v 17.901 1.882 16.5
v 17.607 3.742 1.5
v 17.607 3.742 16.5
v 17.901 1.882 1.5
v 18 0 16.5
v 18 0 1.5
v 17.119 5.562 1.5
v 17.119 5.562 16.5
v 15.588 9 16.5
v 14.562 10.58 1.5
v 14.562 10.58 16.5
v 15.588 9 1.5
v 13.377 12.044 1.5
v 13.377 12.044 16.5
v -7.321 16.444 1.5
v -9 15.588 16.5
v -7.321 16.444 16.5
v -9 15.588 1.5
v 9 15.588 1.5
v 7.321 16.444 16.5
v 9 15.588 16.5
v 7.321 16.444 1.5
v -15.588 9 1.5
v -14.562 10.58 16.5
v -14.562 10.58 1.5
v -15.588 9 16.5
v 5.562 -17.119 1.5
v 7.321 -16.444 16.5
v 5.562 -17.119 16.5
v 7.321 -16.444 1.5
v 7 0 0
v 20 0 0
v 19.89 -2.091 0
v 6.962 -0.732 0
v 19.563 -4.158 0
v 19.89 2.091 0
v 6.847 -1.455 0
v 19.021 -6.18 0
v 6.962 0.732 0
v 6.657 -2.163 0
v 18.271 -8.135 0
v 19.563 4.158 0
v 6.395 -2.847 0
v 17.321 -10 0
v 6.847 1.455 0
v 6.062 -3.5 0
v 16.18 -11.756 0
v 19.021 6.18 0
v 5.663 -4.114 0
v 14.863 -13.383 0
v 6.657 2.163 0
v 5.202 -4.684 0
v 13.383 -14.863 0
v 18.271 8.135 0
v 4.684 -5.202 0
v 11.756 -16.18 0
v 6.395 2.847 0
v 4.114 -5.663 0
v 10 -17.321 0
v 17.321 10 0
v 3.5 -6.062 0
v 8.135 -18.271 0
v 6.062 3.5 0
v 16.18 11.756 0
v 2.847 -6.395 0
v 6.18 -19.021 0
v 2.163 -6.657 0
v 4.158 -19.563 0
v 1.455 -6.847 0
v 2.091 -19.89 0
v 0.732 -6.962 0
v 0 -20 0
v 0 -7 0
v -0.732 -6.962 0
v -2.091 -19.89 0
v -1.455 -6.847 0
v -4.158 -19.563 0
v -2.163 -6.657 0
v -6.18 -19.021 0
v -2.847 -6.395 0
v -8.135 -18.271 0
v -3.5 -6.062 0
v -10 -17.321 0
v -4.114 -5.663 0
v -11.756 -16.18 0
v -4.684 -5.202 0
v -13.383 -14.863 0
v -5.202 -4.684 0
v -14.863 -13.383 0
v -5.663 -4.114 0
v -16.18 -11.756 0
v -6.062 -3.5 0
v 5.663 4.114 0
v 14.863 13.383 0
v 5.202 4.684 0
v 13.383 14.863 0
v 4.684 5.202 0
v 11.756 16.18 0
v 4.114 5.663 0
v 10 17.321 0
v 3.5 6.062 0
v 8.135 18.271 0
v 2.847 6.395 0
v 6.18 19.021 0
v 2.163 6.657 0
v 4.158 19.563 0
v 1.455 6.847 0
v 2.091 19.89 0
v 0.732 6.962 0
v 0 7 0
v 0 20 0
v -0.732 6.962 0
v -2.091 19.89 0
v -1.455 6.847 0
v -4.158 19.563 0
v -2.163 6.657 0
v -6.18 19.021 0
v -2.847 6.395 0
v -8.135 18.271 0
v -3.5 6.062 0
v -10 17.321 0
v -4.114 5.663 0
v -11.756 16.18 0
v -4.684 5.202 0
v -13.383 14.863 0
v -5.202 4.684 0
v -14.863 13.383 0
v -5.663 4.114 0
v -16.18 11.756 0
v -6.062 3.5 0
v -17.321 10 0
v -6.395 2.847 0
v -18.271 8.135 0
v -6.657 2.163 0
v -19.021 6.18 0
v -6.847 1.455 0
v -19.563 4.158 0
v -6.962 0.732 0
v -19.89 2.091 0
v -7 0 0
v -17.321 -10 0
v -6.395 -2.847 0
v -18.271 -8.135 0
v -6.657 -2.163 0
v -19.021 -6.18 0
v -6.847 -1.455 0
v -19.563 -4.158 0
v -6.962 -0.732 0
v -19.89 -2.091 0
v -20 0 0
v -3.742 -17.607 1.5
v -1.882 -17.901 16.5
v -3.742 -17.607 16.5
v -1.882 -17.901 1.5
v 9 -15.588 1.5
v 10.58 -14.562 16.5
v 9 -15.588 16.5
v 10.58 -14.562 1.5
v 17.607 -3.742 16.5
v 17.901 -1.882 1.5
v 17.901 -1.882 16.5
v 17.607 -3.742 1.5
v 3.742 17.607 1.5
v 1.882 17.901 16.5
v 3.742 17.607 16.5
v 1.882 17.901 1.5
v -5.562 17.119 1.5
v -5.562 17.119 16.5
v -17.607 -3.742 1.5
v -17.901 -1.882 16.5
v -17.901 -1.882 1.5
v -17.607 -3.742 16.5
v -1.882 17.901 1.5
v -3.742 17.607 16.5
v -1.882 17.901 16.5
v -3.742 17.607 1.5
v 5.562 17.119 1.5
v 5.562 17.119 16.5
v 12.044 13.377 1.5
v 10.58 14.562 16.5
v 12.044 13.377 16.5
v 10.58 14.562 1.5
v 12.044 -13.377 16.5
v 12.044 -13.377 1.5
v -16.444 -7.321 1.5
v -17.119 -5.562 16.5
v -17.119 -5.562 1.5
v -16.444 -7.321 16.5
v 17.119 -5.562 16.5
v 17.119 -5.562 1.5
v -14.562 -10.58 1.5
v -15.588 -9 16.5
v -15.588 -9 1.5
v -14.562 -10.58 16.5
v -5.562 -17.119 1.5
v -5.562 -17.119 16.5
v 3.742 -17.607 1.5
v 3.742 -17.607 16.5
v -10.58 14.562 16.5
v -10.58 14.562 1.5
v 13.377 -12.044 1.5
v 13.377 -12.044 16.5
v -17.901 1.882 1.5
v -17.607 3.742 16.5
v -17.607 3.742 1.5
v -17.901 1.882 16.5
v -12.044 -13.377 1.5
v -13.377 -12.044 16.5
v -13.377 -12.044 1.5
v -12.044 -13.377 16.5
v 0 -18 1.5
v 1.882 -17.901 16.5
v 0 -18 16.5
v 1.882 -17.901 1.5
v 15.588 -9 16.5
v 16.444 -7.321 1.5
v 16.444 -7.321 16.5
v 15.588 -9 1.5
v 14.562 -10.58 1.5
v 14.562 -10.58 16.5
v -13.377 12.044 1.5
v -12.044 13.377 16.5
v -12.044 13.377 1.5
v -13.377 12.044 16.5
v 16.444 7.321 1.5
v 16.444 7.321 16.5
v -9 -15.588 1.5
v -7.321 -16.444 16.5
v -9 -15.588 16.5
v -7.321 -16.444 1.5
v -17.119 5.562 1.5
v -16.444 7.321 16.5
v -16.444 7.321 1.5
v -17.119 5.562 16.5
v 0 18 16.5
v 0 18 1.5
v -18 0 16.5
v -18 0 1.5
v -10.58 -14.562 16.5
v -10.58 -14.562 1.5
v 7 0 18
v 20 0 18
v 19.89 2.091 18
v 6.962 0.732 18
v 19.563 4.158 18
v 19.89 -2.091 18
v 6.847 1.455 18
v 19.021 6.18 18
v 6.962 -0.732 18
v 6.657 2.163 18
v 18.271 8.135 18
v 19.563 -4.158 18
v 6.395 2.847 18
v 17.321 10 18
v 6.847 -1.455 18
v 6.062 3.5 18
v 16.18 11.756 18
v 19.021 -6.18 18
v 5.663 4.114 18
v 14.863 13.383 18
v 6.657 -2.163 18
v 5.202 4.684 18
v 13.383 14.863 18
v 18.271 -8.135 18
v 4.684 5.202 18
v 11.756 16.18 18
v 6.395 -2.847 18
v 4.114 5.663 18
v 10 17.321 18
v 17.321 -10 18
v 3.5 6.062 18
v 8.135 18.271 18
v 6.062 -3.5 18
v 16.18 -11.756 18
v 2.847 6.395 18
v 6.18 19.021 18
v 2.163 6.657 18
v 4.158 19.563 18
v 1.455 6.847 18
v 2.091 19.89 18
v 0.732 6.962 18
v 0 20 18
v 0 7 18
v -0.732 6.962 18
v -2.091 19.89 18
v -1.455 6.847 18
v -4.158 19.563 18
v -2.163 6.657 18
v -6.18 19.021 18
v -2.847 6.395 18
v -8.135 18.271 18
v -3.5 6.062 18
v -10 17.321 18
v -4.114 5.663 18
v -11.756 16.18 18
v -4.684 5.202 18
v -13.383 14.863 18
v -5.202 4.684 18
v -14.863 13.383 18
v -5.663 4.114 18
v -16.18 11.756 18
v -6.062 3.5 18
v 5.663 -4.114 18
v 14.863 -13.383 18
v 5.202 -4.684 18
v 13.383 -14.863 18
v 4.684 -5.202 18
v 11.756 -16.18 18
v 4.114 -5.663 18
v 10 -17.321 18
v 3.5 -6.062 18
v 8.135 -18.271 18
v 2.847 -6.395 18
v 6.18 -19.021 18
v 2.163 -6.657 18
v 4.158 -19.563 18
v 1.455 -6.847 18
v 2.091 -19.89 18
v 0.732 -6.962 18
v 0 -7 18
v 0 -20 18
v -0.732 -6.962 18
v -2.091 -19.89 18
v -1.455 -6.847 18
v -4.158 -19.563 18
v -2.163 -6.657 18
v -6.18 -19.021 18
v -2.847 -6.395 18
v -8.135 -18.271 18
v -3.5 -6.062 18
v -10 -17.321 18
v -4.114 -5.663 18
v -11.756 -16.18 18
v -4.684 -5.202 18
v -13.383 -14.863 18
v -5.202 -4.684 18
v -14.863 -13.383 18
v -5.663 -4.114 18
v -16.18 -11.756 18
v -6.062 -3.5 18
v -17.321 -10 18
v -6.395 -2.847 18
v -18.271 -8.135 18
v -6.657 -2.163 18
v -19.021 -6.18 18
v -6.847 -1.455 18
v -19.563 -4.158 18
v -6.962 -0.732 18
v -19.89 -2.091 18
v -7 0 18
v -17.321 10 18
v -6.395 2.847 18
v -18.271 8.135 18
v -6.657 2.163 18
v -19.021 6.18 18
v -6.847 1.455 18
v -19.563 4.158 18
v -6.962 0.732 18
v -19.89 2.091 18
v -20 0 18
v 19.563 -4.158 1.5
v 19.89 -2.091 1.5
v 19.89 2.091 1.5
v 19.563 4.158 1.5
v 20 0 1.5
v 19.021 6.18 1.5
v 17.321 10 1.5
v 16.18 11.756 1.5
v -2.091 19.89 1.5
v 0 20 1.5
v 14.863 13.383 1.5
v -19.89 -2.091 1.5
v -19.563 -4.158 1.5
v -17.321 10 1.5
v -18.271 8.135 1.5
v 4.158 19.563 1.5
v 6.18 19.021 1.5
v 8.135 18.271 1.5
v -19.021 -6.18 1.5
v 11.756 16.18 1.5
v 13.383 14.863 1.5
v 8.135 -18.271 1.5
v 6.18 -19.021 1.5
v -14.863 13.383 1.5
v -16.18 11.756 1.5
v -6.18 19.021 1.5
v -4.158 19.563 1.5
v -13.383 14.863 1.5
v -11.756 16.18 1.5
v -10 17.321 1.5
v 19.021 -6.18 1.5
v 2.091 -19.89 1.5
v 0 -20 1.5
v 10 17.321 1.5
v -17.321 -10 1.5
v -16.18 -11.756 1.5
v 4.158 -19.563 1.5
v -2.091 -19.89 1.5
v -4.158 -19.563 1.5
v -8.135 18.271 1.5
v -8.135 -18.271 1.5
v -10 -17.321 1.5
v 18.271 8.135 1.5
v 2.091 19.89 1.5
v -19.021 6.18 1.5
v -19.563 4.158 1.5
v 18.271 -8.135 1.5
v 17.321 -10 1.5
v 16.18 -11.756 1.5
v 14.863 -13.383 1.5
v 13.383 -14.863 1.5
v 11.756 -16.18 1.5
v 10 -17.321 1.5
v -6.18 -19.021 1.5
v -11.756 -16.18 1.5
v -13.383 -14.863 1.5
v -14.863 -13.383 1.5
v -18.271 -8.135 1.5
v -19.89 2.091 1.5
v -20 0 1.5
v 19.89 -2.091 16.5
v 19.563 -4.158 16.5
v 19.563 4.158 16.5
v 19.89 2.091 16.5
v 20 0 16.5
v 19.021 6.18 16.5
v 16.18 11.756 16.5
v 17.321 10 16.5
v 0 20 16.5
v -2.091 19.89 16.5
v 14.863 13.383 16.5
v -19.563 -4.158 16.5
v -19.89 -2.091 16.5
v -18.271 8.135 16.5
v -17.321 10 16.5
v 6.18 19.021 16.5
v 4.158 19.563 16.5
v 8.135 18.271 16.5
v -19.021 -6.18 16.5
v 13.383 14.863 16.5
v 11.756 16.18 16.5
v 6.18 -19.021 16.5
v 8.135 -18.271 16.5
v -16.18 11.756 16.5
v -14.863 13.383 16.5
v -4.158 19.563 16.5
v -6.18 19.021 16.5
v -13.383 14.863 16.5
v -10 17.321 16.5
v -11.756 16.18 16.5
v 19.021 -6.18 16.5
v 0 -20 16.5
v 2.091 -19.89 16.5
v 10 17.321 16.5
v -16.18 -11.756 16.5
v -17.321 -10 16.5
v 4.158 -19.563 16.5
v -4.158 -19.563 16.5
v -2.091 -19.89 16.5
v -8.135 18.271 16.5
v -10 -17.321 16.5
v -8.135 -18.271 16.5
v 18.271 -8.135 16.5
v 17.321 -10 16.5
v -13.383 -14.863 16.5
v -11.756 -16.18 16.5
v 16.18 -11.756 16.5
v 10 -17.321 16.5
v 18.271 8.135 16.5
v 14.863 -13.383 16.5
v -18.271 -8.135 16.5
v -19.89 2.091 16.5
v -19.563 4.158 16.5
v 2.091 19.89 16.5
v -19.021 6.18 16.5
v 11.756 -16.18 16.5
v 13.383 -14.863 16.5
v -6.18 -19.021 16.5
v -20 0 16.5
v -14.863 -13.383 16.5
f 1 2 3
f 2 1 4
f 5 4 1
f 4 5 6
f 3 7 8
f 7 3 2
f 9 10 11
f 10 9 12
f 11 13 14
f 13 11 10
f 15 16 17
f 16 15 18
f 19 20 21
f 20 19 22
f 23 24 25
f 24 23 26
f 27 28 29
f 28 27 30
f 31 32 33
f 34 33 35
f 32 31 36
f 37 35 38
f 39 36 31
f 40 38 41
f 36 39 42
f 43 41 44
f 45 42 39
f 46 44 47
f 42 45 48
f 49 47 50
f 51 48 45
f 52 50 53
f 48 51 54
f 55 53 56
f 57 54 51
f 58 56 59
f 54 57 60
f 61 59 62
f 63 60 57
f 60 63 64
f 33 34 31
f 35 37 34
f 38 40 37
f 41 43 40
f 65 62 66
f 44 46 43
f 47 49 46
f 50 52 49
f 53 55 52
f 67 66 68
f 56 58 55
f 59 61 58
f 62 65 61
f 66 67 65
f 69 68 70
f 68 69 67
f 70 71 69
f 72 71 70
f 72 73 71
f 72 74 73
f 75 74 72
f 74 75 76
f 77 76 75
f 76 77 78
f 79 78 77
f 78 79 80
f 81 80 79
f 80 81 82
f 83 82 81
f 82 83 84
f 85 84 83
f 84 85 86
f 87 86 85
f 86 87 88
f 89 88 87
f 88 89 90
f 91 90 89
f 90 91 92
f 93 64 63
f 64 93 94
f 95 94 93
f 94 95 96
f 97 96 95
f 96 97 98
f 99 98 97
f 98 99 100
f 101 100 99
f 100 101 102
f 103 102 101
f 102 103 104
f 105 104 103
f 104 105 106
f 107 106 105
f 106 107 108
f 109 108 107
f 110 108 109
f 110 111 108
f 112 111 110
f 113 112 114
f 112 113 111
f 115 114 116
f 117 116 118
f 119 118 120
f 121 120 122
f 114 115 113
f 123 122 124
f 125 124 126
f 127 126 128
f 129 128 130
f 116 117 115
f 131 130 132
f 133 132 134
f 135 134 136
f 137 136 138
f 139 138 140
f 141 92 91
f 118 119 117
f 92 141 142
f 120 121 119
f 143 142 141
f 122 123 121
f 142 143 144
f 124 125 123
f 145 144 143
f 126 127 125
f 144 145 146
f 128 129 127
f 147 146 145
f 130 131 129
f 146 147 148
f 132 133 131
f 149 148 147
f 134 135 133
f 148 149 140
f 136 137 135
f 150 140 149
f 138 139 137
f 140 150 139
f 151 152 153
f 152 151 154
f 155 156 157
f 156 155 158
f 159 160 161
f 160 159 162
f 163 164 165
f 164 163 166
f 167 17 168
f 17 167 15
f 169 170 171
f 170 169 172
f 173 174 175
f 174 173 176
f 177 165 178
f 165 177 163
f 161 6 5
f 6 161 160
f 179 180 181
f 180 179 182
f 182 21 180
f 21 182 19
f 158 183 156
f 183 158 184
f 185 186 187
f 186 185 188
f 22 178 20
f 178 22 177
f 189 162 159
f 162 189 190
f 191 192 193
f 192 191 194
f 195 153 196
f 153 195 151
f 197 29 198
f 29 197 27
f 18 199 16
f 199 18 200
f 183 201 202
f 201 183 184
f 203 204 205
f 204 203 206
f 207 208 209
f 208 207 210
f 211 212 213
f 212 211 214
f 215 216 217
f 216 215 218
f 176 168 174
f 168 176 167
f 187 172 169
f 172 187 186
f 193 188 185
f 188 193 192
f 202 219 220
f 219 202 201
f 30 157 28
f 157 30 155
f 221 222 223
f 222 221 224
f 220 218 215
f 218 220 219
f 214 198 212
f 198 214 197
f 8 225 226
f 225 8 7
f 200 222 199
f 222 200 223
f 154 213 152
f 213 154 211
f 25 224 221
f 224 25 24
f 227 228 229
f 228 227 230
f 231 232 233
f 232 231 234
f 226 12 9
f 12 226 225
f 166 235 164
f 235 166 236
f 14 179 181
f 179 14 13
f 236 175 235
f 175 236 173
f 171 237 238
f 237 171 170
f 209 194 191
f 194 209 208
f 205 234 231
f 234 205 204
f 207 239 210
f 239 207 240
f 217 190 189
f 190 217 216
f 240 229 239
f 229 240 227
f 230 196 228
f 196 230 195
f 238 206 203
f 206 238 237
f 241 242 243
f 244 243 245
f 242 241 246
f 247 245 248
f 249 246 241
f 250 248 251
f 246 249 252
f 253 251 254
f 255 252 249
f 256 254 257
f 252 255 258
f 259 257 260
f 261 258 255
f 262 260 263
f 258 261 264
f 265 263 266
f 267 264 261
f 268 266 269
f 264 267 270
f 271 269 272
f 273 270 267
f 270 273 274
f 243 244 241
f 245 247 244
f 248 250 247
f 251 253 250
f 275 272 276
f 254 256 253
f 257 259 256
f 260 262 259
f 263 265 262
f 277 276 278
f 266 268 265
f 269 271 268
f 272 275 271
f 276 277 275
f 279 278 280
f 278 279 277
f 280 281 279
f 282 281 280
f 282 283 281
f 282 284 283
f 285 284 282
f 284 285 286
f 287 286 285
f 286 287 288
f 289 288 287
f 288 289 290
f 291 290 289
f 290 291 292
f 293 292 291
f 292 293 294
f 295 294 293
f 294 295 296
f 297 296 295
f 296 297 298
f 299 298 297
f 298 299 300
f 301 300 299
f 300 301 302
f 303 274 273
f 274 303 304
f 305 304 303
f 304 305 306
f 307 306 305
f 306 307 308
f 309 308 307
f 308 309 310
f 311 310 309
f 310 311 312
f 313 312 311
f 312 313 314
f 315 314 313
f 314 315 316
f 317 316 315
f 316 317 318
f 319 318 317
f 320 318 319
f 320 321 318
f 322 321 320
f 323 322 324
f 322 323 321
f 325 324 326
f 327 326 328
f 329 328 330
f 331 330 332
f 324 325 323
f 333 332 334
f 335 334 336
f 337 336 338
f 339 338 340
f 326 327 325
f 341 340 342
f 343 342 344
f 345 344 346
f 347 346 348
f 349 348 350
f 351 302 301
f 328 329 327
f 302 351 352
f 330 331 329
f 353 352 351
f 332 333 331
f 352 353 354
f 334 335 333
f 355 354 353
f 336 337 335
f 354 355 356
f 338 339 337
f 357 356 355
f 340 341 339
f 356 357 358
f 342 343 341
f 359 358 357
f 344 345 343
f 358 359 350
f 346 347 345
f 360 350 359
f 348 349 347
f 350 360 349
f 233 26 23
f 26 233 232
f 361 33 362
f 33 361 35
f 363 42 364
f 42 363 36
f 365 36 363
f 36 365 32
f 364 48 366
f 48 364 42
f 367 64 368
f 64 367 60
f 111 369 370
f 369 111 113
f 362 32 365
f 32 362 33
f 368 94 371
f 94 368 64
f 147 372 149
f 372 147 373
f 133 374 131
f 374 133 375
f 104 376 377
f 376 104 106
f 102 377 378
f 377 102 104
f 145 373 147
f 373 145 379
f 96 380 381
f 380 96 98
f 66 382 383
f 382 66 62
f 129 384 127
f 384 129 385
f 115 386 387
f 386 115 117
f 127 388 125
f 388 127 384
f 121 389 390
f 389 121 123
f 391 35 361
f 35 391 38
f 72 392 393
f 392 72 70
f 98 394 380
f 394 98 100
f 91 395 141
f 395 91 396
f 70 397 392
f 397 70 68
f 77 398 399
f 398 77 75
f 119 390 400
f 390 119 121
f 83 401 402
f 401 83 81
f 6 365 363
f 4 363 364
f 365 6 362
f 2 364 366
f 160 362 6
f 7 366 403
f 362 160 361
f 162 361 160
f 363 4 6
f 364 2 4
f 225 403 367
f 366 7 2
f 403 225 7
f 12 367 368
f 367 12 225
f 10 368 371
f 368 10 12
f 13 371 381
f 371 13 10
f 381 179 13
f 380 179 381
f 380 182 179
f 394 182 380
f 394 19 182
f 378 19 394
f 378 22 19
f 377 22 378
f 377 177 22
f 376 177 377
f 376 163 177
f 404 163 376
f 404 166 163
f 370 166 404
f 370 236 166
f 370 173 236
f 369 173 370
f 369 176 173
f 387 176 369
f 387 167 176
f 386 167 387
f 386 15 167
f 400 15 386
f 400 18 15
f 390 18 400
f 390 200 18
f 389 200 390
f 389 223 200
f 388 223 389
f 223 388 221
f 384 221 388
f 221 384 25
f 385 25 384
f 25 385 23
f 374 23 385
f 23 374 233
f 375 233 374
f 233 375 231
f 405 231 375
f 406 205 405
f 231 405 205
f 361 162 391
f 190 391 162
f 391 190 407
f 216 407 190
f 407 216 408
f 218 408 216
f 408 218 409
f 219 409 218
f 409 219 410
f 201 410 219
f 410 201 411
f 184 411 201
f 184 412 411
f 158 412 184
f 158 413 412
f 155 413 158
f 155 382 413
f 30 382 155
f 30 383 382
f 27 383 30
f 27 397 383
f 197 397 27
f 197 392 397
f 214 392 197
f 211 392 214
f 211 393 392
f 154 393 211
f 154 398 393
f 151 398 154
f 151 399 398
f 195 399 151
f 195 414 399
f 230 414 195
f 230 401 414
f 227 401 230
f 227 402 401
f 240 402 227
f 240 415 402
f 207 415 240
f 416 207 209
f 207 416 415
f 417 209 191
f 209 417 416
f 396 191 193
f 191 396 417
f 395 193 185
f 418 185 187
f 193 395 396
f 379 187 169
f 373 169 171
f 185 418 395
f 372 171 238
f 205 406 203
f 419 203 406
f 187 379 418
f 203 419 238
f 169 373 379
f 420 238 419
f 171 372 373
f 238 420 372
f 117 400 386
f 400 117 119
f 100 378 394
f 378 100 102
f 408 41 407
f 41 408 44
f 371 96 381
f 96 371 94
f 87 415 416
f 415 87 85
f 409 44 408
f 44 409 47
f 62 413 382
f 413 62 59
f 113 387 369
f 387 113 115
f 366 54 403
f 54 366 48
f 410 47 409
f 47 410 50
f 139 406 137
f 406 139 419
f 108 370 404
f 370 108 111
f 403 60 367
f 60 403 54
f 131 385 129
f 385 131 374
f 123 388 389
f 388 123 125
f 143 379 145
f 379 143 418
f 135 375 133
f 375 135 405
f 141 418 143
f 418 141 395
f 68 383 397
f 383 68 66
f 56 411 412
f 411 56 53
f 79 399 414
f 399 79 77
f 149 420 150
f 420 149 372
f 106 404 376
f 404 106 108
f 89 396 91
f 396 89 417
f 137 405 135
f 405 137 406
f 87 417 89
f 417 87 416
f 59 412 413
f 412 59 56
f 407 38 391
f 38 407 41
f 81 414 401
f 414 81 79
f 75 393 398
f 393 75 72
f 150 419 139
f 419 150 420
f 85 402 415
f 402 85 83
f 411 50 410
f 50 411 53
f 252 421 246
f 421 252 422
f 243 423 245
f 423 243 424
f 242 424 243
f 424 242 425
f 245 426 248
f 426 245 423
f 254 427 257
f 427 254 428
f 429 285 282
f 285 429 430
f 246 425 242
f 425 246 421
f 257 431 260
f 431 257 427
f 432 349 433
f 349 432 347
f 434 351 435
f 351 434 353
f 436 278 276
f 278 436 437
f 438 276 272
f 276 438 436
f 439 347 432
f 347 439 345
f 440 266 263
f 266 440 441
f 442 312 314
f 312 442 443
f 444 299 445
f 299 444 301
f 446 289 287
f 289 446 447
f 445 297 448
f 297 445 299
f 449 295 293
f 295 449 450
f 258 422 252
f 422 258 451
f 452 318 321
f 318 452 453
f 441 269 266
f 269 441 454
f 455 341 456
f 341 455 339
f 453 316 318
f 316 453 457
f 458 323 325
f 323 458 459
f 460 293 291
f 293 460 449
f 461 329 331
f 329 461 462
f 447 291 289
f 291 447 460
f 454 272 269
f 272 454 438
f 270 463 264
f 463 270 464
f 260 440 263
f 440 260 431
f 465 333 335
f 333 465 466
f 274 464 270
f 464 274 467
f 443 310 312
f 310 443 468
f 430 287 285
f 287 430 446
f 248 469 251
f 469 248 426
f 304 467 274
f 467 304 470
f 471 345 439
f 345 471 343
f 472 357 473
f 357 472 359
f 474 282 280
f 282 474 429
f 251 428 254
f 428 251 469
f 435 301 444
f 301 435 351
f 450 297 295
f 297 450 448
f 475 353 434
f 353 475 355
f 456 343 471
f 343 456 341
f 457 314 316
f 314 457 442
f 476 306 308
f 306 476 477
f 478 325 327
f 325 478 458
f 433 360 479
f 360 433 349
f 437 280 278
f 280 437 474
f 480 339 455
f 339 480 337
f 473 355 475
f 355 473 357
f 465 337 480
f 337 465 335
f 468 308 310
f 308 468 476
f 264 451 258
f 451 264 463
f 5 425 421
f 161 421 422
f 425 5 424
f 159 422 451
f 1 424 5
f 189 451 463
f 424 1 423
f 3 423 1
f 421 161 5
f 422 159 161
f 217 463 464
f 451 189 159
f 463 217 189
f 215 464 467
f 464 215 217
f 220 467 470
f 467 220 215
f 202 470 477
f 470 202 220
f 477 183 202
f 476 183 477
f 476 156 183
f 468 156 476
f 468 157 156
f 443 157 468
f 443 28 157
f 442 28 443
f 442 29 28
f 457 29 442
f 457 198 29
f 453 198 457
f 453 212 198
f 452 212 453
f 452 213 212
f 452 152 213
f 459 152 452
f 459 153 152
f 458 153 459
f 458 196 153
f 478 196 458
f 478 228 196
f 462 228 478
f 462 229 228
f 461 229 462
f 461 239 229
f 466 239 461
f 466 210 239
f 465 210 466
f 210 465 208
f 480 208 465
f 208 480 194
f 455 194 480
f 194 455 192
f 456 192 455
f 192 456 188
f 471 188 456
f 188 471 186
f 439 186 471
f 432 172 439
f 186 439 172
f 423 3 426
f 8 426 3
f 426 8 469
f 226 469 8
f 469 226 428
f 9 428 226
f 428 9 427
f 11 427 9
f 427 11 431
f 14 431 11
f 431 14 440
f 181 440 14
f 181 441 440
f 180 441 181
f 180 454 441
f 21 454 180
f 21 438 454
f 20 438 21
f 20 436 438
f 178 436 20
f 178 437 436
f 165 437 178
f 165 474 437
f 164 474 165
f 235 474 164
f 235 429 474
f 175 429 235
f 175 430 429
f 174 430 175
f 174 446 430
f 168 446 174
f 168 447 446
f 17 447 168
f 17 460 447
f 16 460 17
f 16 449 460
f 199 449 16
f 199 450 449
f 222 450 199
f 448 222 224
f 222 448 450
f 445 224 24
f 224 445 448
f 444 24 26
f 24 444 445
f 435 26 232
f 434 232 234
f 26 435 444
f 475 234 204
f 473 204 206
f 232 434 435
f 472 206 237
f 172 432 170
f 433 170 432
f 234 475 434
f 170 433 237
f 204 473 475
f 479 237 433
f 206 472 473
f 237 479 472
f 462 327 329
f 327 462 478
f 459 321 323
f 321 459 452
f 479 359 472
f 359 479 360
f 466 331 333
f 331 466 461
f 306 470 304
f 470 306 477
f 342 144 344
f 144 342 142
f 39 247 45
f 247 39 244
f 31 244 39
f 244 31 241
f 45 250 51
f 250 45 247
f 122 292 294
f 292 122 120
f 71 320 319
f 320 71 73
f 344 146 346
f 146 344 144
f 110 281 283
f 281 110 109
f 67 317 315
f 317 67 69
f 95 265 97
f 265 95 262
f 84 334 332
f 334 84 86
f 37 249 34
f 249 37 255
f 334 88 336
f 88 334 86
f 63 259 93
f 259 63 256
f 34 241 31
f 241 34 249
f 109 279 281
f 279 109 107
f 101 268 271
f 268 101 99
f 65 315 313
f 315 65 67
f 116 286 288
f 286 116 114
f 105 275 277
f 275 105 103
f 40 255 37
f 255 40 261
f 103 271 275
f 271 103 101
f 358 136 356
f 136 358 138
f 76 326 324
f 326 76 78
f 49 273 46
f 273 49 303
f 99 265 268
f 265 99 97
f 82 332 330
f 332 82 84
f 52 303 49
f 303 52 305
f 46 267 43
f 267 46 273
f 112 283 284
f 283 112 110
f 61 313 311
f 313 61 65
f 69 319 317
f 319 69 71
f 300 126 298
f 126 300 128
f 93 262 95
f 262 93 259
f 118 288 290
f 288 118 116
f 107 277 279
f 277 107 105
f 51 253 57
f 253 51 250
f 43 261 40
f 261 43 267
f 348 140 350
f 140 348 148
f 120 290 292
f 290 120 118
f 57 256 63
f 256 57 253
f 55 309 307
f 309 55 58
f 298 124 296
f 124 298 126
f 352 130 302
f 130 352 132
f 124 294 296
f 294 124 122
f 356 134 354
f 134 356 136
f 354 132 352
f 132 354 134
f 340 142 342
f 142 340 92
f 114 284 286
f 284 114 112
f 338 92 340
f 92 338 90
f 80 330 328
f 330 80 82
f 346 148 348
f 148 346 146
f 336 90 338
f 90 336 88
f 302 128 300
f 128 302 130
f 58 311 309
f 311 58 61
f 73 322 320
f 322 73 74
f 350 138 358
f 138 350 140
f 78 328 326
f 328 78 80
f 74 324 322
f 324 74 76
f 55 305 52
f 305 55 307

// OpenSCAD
// Plain idler pulley with retaining flanges.
$fn = 60;
eps = 0.02;
bore_d = 14;
body_d = 36;
width = 18;
flange_t = 1.5;
difference() {
    union() {
        cylinder(d=body_d,h=width);
        cylinder(d=body_d+4,h=flange_t);
        translate([0,0,width-flange_t]) cylinder(d=body_d+4,h=flange_t);
    }
    translate([0,0,-eps]) cylinder(d=bore_d,h=width+2*eps);
}
